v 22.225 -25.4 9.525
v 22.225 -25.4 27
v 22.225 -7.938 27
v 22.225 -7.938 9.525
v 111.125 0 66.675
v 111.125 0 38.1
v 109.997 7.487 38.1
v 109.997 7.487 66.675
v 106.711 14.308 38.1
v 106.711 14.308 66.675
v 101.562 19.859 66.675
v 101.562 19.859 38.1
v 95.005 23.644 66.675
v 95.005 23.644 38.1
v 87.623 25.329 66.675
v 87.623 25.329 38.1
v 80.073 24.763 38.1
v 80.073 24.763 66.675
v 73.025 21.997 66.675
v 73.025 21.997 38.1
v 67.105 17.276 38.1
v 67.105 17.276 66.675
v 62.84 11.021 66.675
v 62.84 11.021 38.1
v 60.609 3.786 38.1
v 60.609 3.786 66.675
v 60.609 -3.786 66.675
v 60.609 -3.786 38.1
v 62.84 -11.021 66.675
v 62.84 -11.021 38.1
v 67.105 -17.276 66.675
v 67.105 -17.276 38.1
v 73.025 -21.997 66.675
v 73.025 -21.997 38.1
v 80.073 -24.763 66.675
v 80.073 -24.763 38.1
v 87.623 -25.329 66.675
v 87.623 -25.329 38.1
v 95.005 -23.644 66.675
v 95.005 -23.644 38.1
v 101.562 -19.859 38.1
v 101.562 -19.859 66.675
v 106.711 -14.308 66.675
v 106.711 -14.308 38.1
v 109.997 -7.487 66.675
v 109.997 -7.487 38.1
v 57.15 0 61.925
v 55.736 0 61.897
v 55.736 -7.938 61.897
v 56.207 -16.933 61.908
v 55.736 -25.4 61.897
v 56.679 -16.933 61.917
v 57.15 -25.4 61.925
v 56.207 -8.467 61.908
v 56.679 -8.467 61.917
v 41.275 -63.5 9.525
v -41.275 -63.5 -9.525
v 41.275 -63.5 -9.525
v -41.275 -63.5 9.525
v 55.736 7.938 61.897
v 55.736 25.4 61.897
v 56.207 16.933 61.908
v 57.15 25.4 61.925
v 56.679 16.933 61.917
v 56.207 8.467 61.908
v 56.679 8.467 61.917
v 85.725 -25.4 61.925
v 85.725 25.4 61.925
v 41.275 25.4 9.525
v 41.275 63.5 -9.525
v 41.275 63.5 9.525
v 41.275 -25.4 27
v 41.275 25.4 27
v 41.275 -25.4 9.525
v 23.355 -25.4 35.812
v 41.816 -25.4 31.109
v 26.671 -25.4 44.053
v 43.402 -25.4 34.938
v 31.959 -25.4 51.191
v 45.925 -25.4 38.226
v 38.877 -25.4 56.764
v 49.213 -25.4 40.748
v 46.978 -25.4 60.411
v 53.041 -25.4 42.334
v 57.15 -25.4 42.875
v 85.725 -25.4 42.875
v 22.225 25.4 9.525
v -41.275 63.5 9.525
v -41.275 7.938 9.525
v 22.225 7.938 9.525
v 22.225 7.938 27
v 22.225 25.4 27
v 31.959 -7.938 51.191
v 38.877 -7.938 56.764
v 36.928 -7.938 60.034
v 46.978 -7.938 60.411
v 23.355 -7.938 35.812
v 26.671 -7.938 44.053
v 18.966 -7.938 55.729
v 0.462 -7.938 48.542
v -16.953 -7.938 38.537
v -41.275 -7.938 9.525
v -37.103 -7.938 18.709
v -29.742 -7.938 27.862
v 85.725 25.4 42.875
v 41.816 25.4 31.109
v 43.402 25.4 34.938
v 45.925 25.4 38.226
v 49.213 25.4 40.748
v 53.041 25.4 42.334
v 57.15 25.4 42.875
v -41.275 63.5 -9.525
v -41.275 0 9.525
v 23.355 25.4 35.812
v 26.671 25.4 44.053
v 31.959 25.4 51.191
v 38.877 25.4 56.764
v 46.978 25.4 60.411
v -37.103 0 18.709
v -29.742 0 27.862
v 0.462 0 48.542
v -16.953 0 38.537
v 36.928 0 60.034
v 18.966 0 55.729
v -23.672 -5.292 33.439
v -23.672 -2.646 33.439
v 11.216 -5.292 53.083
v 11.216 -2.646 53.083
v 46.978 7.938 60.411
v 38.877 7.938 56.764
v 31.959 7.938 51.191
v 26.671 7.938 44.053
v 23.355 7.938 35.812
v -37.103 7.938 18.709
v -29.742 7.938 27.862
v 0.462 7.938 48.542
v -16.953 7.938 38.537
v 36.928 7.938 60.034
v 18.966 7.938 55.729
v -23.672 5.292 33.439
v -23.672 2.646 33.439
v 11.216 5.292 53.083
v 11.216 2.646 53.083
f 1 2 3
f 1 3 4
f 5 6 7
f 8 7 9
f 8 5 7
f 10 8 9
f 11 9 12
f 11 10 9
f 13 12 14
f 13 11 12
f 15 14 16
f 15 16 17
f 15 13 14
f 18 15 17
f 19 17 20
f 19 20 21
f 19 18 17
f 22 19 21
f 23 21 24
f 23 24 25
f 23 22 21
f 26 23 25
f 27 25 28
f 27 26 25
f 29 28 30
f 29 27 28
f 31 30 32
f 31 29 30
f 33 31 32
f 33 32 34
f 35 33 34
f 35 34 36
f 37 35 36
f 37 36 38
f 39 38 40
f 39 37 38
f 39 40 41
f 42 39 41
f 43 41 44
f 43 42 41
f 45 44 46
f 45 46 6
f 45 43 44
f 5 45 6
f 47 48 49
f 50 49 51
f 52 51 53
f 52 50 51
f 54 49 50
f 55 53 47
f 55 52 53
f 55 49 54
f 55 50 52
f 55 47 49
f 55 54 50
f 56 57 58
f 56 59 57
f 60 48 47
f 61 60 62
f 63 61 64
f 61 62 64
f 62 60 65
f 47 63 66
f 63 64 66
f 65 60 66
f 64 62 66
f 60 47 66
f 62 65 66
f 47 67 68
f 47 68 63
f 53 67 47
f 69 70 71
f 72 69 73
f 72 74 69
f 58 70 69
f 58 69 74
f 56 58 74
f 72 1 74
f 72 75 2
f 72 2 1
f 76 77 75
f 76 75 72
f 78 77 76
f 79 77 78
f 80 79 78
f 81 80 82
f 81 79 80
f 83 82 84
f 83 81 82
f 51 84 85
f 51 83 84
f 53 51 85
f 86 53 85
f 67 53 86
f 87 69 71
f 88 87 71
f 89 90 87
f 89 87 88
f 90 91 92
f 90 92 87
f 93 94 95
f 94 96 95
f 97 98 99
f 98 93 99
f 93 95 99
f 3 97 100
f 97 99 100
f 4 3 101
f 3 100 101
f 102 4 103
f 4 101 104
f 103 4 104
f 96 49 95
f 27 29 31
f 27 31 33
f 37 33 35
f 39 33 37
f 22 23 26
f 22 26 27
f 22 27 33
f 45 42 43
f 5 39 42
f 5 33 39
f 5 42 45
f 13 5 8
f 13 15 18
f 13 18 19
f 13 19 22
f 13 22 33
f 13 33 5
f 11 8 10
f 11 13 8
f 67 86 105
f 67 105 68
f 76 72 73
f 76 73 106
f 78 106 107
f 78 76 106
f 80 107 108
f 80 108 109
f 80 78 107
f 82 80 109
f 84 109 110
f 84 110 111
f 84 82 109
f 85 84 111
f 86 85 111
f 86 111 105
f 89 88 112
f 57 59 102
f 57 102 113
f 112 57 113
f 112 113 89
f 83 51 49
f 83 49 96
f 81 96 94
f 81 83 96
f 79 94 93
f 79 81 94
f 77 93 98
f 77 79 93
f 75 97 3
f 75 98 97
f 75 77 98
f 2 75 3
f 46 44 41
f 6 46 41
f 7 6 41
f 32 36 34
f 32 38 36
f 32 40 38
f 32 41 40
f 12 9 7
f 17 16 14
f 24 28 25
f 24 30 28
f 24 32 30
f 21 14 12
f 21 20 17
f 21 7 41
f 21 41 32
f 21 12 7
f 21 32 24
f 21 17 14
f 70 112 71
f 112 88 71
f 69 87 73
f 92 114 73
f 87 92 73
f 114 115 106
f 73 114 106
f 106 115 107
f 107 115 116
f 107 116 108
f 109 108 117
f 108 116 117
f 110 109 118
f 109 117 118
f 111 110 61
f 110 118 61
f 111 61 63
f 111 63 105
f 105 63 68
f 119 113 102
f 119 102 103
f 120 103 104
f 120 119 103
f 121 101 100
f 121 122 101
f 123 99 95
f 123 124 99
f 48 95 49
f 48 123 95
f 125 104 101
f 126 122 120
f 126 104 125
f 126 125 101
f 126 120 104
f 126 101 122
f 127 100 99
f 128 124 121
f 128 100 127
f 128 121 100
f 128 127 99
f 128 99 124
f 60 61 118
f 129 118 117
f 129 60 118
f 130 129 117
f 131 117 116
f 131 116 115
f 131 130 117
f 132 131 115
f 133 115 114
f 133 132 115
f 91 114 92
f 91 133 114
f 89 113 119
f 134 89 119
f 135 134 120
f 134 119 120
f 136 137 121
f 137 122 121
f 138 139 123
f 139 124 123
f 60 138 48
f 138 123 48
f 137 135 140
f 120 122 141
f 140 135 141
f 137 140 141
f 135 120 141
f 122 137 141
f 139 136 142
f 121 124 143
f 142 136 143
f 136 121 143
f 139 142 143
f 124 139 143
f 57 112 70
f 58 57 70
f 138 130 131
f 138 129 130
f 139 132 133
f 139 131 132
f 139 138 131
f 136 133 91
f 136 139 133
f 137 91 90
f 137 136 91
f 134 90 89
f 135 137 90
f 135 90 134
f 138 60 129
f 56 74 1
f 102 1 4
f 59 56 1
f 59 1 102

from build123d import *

# Parameters (mm, degrees)
F1_DEPTH = 63.5
F0_W     = 25.4
F0_H     = 19.05
F2_DEPTH = 25.4
F3_DEPTH = 7.9375


with BuildPart() as f1:
    # F0 (on Front) → F1 (new body, symmetric)
    with BuildSketch(Plane.XZ):
        Polygon((-41.275, -9.525), (41.275, -9.525), (41.275, 9.525), (22.225, 9.525), (-41.275, 9.525), align=None)
    extrude(amount=F1_DEPTH, both=True)

    # F0 (on Front) → F2 (join, symmetric)
    with BuildSketch(Plane.XZ):
        with BuildLine():
            Line((22.225, 9.525), (41.275, 9.525))
            Line((41.275, 9.525), (41.275, 27.0002))
            ThreePointArc((41.275, 27.0002), (45.9246798487, 38.2255201513), (57.15, 42.8752))
            Line((57.15, 42.8752), (60.325, 42.8752))
            Line((60.325, 42.8752), (60.325, 61.9252))
            Line((60.325, 61.9252), (57.15, 61.9252))
            add(Edge.make_bspline(
                [(55.736210138, 61.8965726371), (56.2071847763, 61.9087688492), (56.6784597791, 61.9183213431), (57.15, 61.9252)],
                knots=[110.3931968845, 110.3931968845, 110.3931968845, 110.3931968845, 111.5045361635, 111.5045361635, 111.5045361635, 111.5045361635], degree=3))
            ThreePointArc((55.736210138, 61.8965726371), (31.9594041761, 51.1908905035), (22.225, 27.0002))
            Line((22.225, 27.0002), (22.225, 9.525))
        make_face()
        with Locations((73.025, 52.4002)):
            Rectangle(F0_W, F0_H)
    extrude(amount=F2_DEPTH, both=True)

    # F0 (on Front) → F3 (join, symmetric)
    with BuildSketch(Plane.XZ):
        with BuildLine():
            add(Edge.make_bspline(
                [(-41.275, 9.525), (-34.8671501802, 33.3876511946), (8.9526608143, 60.6850804595), (55.736210138, 61.8965726371)],
                knots=[0, 0, 0, 0, 110.3931968845, 110.3931968845, 110.3931968845, 110.3931968845], degree=3))
            Line((-41.275, 9.525), (22.225, 9.525))
            Line((22.225, 9.525), (22.225, 27.0002))
            ThreePointArc((22.225, 27.0002), (31.9594041761, 51.1908905035), (55.736210138, 61.8965726371))
        make_face()
    extrude(amount=F3_DEPTH, both=True)


with BuildPart() as f4:
    # F0 (on Front) → F4 (revolve)
    with BuildSketch(Plane.XZ):
        Polygon((85.725, 61.9252), (85.725, 42.8752), (85.725, 38.1), (111.125, 38.1), (111.125, 66.675), (85.725, 66.675), align=None)
    revolve(axis=Axis((85.725, 0, 52.4002), (0, 0, 1)))


solid = Compound([f1.part, f4.part])
